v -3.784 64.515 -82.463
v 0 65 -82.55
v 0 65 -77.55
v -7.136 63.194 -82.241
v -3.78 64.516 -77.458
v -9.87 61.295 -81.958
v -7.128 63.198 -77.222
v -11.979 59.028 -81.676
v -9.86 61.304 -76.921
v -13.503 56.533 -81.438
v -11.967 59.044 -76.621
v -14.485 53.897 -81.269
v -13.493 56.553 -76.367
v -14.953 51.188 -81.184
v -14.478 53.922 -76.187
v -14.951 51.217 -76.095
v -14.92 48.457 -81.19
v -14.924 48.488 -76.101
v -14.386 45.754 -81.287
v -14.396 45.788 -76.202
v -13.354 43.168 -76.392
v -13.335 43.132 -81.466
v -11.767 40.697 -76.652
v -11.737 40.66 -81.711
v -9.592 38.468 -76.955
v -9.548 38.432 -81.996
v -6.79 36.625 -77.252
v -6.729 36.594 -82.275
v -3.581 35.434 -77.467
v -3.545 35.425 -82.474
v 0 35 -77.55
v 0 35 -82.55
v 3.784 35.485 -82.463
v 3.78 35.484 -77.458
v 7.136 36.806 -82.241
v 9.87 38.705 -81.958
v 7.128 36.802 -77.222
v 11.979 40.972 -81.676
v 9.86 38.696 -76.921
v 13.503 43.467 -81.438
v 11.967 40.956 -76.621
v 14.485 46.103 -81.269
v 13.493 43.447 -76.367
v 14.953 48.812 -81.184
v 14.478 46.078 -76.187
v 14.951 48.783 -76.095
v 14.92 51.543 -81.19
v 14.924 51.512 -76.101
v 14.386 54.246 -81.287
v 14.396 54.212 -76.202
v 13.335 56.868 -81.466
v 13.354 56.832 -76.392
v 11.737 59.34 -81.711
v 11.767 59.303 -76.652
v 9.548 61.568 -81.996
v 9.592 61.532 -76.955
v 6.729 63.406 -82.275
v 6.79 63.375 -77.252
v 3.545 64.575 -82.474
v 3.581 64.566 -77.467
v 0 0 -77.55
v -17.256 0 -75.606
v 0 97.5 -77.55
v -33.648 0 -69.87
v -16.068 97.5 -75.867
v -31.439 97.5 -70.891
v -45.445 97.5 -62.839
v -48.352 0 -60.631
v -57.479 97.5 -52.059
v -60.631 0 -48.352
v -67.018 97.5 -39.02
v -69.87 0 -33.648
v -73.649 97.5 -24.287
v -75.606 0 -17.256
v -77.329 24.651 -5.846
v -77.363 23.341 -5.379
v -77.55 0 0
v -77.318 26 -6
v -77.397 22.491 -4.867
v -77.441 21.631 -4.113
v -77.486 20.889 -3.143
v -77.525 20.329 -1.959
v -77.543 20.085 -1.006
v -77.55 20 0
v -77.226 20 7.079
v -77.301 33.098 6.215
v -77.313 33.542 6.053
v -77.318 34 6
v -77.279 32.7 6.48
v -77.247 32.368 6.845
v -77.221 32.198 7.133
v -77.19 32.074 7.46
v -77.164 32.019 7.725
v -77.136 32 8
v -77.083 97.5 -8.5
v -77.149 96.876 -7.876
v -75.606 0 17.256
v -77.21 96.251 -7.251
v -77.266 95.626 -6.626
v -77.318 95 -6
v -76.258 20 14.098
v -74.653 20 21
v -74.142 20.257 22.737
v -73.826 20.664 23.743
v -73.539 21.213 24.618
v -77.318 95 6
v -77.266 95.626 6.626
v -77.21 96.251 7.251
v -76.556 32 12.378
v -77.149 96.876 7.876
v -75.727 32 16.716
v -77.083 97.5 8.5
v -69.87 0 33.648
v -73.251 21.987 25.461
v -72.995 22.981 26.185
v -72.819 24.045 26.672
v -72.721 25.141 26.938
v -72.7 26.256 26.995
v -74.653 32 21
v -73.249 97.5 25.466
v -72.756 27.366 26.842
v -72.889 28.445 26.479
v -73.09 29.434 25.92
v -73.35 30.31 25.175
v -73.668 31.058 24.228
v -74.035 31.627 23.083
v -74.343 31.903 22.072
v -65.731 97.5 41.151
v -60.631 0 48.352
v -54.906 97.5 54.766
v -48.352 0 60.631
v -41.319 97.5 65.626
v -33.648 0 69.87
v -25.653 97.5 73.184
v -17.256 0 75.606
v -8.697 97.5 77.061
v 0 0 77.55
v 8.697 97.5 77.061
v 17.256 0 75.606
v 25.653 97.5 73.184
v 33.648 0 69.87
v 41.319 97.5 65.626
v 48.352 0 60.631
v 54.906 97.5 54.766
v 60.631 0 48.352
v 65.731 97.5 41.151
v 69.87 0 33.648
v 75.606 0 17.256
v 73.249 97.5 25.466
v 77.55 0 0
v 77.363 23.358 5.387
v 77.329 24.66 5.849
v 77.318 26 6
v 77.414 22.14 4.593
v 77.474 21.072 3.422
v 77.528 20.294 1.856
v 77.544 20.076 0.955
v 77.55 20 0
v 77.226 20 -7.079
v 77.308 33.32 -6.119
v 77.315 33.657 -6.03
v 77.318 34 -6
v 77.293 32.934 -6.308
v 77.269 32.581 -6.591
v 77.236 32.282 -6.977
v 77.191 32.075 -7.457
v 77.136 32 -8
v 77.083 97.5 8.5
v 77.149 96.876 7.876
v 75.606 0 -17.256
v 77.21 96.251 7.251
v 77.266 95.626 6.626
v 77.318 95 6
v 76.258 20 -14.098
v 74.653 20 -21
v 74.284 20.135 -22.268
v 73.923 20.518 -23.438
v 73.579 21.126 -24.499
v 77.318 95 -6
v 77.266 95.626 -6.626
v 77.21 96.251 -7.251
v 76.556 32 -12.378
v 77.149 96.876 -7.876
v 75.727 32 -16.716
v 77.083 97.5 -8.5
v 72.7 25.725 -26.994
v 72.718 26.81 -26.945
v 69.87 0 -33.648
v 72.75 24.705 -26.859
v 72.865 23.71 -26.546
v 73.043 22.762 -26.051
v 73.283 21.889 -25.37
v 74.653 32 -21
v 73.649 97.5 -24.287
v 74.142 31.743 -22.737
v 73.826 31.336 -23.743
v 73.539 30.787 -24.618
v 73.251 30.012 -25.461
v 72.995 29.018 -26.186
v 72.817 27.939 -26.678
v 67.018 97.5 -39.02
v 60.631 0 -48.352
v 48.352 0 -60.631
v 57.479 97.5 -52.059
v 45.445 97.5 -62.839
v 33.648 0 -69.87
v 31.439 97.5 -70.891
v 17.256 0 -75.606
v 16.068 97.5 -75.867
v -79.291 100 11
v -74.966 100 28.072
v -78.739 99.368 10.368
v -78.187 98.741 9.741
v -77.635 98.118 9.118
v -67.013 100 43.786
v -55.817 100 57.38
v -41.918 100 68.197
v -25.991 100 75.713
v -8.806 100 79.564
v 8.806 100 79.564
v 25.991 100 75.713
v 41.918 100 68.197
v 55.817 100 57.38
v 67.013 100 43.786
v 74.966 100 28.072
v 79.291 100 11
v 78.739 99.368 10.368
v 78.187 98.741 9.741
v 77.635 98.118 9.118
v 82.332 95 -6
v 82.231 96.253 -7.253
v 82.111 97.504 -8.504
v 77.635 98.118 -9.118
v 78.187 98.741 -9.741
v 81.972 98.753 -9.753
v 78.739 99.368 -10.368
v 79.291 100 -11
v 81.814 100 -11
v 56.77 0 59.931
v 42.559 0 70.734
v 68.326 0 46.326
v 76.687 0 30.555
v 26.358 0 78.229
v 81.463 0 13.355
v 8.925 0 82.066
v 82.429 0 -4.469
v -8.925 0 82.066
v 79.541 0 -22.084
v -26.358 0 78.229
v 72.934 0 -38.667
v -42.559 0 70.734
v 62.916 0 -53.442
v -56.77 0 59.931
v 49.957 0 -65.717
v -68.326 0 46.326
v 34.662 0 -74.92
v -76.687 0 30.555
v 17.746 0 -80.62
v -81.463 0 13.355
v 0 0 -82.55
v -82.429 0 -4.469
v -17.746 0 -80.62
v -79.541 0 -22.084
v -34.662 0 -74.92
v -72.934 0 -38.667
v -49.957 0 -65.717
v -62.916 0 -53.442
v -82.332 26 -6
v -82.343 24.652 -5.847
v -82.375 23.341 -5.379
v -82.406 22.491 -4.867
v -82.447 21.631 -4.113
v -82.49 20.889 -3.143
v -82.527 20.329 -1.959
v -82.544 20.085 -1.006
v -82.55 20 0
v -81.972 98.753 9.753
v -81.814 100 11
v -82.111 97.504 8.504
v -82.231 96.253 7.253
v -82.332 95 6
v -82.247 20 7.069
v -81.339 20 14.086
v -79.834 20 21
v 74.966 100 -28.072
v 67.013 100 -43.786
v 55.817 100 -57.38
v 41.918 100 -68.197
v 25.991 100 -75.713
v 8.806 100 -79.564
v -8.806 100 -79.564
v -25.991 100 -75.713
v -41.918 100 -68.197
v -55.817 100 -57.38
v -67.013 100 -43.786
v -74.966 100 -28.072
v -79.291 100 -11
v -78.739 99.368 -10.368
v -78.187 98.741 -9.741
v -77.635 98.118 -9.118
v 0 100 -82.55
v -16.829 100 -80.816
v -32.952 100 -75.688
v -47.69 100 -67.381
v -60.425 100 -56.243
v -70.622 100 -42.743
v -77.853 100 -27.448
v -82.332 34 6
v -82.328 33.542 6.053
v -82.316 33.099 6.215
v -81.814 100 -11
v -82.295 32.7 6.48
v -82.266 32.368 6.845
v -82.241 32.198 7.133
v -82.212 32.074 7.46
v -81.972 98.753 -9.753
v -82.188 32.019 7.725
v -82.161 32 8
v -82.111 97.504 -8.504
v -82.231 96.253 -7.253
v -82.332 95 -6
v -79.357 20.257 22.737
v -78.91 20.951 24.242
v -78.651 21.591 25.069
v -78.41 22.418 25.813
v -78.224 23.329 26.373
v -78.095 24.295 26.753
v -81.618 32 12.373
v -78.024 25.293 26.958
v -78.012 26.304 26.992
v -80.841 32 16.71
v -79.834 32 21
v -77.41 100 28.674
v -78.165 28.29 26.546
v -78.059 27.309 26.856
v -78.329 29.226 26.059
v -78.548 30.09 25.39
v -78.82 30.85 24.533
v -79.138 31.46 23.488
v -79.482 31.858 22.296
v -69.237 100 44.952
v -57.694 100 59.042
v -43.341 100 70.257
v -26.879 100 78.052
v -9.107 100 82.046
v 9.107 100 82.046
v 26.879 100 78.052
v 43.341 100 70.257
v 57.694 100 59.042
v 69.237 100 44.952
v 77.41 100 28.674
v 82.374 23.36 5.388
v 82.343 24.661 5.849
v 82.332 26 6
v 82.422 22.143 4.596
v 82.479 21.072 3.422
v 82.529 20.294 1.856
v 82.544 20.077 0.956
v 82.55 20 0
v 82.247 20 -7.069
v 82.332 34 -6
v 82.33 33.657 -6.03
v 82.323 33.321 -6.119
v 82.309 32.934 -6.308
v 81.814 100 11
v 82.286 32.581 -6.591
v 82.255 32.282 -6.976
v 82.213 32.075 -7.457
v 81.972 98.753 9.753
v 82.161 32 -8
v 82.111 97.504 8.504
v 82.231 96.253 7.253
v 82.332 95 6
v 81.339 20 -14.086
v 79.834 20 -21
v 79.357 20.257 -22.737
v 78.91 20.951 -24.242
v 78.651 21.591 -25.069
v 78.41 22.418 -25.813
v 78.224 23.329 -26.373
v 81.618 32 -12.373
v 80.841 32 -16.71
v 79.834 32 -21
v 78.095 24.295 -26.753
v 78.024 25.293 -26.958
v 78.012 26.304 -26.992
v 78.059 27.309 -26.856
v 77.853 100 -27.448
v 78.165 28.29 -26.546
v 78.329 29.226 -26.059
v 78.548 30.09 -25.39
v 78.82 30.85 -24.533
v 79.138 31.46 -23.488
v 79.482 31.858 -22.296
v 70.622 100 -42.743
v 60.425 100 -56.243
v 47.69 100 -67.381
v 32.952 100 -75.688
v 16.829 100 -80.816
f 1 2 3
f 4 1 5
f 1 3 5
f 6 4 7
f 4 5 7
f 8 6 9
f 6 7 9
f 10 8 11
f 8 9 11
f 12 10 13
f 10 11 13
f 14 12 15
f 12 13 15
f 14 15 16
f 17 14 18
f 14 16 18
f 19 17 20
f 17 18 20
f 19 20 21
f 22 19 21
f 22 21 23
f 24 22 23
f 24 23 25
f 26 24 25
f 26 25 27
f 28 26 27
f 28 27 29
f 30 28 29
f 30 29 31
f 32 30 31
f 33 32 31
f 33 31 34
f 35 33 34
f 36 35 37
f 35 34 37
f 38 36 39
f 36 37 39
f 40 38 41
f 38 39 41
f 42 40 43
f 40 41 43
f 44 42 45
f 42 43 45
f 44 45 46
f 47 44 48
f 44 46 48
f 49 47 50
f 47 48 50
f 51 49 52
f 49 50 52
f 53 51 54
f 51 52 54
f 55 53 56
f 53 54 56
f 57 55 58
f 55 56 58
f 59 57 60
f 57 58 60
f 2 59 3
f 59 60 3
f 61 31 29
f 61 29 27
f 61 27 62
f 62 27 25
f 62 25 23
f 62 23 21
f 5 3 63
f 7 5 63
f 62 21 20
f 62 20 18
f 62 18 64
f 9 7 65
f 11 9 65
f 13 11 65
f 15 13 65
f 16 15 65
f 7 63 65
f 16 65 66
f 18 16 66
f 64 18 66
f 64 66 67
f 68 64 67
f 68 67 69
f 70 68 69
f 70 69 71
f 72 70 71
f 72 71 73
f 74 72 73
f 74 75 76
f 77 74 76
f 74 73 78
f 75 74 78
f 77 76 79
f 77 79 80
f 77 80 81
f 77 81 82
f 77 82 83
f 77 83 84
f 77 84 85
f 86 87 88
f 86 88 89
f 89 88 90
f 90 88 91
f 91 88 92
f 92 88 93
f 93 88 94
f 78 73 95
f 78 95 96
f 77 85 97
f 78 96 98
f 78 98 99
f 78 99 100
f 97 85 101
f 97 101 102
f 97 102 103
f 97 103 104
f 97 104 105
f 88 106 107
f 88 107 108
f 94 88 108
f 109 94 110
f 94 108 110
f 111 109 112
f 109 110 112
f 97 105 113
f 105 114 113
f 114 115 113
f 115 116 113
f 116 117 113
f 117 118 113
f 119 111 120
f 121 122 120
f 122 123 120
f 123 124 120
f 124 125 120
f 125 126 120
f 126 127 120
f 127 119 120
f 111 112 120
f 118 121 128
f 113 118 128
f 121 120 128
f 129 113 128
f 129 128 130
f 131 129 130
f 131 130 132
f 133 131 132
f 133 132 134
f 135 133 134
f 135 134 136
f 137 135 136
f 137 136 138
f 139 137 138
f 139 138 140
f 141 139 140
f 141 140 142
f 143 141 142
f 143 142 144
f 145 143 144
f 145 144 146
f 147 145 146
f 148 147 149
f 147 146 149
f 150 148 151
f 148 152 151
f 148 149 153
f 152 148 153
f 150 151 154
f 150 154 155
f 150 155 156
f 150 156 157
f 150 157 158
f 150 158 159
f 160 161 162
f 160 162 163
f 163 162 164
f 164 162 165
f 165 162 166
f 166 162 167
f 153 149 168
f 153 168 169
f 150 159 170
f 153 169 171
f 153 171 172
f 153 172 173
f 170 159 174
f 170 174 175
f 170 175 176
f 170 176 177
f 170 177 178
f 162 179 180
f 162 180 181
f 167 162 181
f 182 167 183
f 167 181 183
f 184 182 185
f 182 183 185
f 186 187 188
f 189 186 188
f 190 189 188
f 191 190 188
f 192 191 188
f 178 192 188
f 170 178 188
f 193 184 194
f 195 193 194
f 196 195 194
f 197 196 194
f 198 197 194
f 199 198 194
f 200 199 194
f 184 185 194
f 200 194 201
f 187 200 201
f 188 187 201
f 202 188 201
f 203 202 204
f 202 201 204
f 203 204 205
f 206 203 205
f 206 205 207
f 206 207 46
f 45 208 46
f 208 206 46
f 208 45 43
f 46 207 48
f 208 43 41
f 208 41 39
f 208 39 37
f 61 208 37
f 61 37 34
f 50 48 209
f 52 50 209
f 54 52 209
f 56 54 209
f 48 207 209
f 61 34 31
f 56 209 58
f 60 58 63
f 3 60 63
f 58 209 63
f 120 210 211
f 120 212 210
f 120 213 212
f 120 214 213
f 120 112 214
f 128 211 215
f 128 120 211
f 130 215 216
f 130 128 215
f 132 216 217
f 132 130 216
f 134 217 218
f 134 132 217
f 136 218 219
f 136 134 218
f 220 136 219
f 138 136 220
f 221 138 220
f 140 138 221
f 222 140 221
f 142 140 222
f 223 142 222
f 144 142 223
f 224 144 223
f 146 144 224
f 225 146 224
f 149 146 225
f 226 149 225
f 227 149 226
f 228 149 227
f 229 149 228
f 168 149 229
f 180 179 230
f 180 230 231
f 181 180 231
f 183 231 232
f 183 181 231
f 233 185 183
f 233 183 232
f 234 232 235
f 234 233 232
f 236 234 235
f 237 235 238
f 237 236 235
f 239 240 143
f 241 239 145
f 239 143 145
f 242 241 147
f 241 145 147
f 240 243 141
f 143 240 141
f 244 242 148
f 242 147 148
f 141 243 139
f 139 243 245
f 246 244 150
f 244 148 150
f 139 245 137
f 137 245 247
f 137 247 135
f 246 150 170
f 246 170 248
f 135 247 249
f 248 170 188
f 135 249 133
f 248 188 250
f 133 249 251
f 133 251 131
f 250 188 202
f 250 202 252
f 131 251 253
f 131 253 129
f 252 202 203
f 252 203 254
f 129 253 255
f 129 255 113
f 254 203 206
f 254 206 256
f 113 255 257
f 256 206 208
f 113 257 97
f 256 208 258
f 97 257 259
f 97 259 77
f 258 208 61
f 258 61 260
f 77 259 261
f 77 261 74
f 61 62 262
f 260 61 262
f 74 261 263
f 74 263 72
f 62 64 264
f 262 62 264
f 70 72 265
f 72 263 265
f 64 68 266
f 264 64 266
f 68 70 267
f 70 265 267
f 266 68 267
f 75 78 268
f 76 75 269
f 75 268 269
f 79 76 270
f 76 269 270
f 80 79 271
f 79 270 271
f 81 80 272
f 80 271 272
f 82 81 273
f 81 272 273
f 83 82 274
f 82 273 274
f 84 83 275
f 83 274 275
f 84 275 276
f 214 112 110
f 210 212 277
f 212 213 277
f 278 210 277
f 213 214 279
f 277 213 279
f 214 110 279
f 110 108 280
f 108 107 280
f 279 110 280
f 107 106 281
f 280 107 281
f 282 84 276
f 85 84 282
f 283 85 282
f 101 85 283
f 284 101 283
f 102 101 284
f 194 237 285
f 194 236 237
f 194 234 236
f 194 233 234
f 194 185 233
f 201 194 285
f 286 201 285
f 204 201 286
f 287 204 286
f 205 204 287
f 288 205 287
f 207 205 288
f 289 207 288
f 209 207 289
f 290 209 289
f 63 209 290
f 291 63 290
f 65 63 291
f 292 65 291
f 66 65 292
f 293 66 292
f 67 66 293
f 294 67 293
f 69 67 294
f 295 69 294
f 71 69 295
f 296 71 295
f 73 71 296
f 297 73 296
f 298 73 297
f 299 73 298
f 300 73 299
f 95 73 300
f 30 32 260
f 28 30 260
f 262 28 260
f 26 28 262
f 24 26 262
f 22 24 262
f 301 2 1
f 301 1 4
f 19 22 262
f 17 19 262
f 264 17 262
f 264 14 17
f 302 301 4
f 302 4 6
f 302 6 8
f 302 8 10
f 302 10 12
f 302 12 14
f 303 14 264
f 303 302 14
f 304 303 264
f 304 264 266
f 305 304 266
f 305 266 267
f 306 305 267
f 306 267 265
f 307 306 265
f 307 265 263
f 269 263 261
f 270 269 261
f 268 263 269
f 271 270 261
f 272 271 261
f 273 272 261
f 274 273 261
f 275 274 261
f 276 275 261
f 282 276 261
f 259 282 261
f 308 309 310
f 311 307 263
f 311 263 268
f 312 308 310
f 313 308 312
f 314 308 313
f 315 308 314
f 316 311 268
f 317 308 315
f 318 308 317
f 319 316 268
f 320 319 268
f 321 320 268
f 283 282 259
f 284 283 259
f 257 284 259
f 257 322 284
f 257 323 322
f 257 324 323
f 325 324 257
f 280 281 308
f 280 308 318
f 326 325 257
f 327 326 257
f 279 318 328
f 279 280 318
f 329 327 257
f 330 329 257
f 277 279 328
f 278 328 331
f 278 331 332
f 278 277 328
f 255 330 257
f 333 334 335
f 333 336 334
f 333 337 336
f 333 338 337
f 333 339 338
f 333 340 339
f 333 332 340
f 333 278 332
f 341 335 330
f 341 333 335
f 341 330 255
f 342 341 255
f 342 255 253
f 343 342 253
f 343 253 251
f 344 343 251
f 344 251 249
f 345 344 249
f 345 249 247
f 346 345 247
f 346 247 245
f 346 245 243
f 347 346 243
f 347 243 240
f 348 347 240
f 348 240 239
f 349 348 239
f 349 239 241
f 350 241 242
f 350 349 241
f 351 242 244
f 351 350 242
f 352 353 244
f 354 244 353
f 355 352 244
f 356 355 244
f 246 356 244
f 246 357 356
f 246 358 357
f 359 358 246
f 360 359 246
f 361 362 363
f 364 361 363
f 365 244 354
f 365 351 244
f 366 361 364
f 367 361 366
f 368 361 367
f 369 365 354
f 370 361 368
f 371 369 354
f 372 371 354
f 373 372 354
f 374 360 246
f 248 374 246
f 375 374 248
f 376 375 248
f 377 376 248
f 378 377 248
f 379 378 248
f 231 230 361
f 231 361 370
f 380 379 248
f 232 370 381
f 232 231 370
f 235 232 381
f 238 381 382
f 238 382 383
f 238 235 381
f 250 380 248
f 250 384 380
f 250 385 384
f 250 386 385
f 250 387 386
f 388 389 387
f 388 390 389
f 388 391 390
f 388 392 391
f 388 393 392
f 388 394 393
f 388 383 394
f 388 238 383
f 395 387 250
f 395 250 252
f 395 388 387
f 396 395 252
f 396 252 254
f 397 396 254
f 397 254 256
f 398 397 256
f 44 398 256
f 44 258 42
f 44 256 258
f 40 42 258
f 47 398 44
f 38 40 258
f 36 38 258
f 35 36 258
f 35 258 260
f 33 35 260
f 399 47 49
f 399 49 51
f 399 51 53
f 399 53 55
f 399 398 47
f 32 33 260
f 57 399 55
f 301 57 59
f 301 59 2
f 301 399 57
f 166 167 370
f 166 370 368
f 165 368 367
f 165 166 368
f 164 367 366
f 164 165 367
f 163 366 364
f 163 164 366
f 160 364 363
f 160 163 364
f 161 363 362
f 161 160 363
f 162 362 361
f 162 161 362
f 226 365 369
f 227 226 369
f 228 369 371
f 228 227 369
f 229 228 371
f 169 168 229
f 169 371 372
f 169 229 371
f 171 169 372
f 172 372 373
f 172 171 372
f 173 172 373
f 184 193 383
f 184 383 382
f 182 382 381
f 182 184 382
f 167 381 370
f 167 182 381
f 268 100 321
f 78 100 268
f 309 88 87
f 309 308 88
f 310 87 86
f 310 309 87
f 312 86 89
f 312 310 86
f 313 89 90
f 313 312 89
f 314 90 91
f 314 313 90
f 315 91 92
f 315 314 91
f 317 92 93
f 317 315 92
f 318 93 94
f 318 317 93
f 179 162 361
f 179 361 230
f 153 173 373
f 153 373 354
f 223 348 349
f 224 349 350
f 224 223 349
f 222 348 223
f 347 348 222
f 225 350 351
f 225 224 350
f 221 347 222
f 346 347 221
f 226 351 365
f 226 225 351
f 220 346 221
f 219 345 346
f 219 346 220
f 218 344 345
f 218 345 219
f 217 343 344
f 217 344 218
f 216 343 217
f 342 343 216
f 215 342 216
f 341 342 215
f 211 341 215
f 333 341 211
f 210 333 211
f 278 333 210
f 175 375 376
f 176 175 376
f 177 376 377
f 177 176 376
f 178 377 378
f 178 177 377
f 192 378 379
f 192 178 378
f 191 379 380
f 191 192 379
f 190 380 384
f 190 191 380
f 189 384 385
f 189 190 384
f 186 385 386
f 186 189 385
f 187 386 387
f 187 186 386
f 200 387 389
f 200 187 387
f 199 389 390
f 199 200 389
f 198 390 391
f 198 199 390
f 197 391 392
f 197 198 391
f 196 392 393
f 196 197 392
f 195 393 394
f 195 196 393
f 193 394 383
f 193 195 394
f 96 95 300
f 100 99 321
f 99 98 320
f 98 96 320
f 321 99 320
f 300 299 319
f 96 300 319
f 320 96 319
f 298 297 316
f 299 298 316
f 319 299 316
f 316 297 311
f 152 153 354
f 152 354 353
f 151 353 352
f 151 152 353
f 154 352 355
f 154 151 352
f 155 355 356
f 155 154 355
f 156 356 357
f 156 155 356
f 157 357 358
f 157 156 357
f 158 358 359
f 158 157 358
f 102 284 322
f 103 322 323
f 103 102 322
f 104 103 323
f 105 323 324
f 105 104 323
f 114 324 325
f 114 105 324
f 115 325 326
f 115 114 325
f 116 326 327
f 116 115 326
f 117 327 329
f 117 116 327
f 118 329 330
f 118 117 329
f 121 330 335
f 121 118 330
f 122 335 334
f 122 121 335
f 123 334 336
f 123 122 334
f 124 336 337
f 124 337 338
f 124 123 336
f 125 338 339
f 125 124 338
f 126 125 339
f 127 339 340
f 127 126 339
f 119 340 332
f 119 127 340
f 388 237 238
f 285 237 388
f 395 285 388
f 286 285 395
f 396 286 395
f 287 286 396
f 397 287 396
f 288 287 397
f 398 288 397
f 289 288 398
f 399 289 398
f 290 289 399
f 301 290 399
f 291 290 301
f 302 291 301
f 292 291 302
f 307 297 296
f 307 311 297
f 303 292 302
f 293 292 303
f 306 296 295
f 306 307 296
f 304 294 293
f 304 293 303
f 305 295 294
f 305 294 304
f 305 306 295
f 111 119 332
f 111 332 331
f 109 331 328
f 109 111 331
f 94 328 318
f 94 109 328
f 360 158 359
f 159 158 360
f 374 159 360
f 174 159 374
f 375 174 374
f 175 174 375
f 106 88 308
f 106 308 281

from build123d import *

# Parameters (mm, degrees)
SKETCH2_W          = 5
SKETCH2_H          = 100
CUT_EXTRUDE1_DEPTH = 154.717289203
FILLET1_R          = 6
CHAMFER1_SIZE      = 5
CHAMFER2_SIZE      = 2.5
FILLET4_R          = 2
CIRPATTERN1_START  = 72.698022634
CIRPATTERN1_DEPTH  = 9.851977366
SKETCH4_R          = 15
CUT_EXTRUDE2_DEPTH = 100


# Read off the part's stored shape, not the designer's step: CirPattern1
with BuildPart() as part:
    # Sketch2 → Revolve1 (revolve)
    with BuildSketch(Plane(origin=(0, 0, 0), x_dir=(0, 0, -1), z_dir=(1, 0, 0)), mode=Mode.PRIVATE) as revolve1_sk:
        with Locations((-80.05, 50)):
            Rectangle(SKETCH2_W, SKETCH2_H)
    revolve(revolve1_sk.sketch.rotate(Axis((0, -5, 0), (0, 1, 0)), 180), axis=Axis((0, -5, 0), (0, 1, 0)))

    # Sketch3 → Cut-Extrude1 (cut, through all)
    with BuildSketch(Plane(origin=(0, 0, 0), x_dir=(0, 0, -1), z_dir=(1, 0, 0))):
        with BuildLine():
            Line((-6, 100), (6, 100))
            Line((6, 100), (6, 20))
            Line((6, 20), (-21, 20))
            ThreePointArc((-21, 20), (-27, 26), (-21, 32))
            Line((-21, 32), (-6, 32))
            Line((-6, 32), (-6, 100))
        make_face()
    extrude(amount=-CUT_EXTRUDE1_DEPTH, mode=Mode.SUBTRACT)

    # Fillet1
    fillet1_edges = [part.edges().sort_by_distance(p)[0] for p in [
        (-79.824602438, 20, -6),
    ]]
    fillet(fillet1_edges, radius=FILLET1_R)

    # Chamfer1
    chamfer1_edges = [part.edges().sort_by_distance(p)[0] for p in [
        (-79.824602438, 100, -6),
        (-79.824602438, 100, 6),
    ]]
    chamfer(chamfer1_edges, length=CHAMFER1_SIZE)

    # Chamfer2
    chamfer2_edges = [part.edges().sort_by_distance(p)[0] for p in [
        (58.596298945, 100, 50.798388262),
    ]]
    chamfer(chamfer2_edges, length=CHAMFER2_SIZE)

    # Fillet4
    fillet4_edges = [part.edges().sort_by_distance(p)[0] for p in [
        (-79.824602438, 32, 6),
    ]]
    fillet(fillet4_edges, radius=FILLET4_R)

    # CirPattern1 outline → CirPattern1 (cut)
    with BuildSketch(Plane.YZ.offset(CIRPATTERN1_START)):
        with BuildLine():
            ThreePointArc((26, 6), (21.757359313, 4.242640687), (20, 0))
            Line((20, 0), (20, -21))
            ThreePointArc((20, -21), (26, -27), (32, -21))
            Line((32, -21), (32, -8))
            ThreePointArc((32, -8), (32.585786438, -6.585786438), (34, -6))
            Line((34, -6), (95, -6))
            Line((95, -6), (100, -11))
            Line((100, -11), (100, 11))
            Line((100, 11), (95, 6))
            Line((95, 6), (26, 6))
        make_face()
    extrude(amount=CIRPATTERN1_DEPTH, mode=Mode.SUBTRACT)

    # Sketch4 → Cut-Extrude2 (cut)
    with BuildSketch(Plane.XY):
        with Locations(Location((0, 50, 0), (0, 0, 90))):
            Circle(SKETCH4_R)
    extrude(amount=-CUT_EXTRUDE2_DEPTH, mode=Mode.SUBTRACT)


solid = part.part
